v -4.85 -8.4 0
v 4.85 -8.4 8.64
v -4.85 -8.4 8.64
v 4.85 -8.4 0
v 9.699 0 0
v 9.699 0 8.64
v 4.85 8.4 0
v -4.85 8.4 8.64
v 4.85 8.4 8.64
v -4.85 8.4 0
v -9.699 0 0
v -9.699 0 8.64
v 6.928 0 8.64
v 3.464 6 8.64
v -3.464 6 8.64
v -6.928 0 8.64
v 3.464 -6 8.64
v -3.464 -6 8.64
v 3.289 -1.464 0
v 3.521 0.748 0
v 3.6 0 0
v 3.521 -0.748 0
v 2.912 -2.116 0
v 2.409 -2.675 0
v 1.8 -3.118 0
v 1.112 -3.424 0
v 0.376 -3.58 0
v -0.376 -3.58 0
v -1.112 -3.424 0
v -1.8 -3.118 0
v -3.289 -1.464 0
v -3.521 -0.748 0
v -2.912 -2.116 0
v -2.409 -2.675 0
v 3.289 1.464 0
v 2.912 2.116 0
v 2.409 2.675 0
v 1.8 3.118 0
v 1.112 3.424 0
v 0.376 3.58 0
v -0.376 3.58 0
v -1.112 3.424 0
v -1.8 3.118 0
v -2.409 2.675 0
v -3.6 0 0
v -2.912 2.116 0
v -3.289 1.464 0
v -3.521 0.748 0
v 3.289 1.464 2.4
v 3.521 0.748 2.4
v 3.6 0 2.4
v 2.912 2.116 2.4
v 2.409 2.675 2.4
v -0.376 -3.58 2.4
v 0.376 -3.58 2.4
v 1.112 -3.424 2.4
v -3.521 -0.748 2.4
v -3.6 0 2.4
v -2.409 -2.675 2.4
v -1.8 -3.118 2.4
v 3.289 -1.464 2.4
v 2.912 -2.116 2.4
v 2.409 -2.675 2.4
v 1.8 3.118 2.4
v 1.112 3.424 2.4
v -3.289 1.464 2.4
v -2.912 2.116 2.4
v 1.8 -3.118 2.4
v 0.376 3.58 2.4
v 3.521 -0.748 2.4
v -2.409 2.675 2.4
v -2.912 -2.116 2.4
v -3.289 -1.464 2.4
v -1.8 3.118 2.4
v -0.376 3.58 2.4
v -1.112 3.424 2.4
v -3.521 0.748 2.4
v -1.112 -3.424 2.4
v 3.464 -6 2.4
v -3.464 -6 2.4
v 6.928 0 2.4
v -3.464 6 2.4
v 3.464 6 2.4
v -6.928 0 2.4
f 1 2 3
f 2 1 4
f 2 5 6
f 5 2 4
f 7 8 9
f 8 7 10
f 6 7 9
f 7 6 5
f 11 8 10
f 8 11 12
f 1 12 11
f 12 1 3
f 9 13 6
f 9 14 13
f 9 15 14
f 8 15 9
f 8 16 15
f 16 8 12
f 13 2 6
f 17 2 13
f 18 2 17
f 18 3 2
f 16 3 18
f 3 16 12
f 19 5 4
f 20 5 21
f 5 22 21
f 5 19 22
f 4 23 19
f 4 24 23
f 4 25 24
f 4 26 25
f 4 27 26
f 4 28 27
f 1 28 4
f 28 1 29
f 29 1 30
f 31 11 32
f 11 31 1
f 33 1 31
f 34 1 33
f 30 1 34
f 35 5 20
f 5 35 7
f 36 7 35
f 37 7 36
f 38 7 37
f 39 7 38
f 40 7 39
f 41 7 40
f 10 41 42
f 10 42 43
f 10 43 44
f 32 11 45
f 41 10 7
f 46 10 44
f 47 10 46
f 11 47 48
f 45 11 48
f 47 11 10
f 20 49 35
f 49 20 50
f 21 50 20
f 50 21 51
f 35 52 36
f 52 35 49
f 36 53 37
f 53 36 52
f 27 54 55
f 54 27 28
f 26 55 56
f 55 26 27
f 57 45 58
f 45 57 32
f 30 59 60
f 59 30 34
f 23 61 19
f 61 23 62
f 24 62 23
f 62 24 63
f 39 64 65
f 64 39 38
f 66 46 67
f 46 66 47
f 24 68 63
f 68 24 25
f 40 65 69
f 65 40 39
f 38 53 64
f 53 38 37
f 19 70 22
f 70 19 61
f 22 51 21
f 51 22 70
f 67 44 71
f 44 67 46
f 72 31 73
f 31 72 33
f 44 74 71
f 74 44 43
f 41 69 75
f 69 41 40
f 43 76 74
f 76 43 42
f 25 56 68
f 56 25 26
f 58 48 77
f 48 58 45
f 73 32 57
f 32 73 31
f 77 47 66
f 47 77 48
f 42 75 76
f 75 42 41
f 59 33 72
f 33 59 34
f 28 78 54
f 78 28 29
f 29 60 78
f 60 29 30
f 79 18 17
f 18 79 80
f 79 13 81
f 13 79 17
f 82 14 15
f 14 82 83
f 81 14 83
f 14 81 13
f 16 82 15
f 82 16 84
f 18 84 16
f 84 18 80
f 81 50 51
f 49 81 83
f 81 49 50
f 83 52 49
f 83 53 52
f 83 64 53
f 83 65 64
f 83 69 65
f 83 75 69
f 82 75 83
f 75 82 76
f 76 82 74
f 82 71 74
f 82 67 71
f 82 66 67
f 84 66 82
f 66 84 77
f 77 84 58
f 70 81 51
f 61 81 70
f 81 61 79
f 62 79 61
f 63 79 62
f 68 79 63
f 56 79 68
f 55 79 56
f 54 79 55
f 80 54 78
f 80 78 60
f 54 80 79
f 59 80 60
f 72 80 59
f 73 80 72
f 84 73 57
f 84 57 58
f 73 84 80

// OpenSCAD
// -*- mode: SCAD ; c-file-style: "ellemtel" ; coding: utf-8 -*-
//
// Simple tool to pull out hex nuts with a bolt
//
// © 2017 Roland Sieker <ospalh@gmail.com>
// Licence: CC-BY-SA 4.0


// Set this to “render” and click on “Create Thing” when done with the setup.
preview = 0; // [0:render, 1:preview]

M = 10;  // M6
s = 5.2; // M6
d = 6;

/* [Hidden] */

// Done with the customizer

w = 2.4;  // external wall width
p = 2.4;  // height of the bottomt plate

// *******************************************************
// Some shortcuts. These shouldn’t be changed

tau = 2 * PI;  // π is still wrong. τ = ⌀ ÷ r
angle = 60; // Overhangs much below 60° are a problem for me


wf = 1.2;

e = M * 2/sqrt(3);


some_distance = 50;
ms = 0.01;  // Muggeseggele.

rme = e/2  * wf;
rse = d/2 * wf;
se = s * wf;
wp = w *2/sqrt(3);

// fn for differently sized objects, for preview or rendering.
pfa = 40;
pfb = 15;
rfa = 180;
rfb = 30;
function fa() = (preview) ? pfa : rfa;
function fb() = (preview) ? pfb : rfb;

// *******************************************************
// End setup



// *******************************************************
// Generate the parts


extractor();

module extractor()
{
   difference()
   {
      cylinder(r=rme+wp, h=se+p, $fn=6);
      translate([0,0,-ms])
      {
         cylinder(r=rse, h=se+p+2*ms, $fn=fb());
      }
      translate([0, 0, p])
      {
         cylinder(r=rme, h=se+ms, $fn=6);
      }

   }
}
